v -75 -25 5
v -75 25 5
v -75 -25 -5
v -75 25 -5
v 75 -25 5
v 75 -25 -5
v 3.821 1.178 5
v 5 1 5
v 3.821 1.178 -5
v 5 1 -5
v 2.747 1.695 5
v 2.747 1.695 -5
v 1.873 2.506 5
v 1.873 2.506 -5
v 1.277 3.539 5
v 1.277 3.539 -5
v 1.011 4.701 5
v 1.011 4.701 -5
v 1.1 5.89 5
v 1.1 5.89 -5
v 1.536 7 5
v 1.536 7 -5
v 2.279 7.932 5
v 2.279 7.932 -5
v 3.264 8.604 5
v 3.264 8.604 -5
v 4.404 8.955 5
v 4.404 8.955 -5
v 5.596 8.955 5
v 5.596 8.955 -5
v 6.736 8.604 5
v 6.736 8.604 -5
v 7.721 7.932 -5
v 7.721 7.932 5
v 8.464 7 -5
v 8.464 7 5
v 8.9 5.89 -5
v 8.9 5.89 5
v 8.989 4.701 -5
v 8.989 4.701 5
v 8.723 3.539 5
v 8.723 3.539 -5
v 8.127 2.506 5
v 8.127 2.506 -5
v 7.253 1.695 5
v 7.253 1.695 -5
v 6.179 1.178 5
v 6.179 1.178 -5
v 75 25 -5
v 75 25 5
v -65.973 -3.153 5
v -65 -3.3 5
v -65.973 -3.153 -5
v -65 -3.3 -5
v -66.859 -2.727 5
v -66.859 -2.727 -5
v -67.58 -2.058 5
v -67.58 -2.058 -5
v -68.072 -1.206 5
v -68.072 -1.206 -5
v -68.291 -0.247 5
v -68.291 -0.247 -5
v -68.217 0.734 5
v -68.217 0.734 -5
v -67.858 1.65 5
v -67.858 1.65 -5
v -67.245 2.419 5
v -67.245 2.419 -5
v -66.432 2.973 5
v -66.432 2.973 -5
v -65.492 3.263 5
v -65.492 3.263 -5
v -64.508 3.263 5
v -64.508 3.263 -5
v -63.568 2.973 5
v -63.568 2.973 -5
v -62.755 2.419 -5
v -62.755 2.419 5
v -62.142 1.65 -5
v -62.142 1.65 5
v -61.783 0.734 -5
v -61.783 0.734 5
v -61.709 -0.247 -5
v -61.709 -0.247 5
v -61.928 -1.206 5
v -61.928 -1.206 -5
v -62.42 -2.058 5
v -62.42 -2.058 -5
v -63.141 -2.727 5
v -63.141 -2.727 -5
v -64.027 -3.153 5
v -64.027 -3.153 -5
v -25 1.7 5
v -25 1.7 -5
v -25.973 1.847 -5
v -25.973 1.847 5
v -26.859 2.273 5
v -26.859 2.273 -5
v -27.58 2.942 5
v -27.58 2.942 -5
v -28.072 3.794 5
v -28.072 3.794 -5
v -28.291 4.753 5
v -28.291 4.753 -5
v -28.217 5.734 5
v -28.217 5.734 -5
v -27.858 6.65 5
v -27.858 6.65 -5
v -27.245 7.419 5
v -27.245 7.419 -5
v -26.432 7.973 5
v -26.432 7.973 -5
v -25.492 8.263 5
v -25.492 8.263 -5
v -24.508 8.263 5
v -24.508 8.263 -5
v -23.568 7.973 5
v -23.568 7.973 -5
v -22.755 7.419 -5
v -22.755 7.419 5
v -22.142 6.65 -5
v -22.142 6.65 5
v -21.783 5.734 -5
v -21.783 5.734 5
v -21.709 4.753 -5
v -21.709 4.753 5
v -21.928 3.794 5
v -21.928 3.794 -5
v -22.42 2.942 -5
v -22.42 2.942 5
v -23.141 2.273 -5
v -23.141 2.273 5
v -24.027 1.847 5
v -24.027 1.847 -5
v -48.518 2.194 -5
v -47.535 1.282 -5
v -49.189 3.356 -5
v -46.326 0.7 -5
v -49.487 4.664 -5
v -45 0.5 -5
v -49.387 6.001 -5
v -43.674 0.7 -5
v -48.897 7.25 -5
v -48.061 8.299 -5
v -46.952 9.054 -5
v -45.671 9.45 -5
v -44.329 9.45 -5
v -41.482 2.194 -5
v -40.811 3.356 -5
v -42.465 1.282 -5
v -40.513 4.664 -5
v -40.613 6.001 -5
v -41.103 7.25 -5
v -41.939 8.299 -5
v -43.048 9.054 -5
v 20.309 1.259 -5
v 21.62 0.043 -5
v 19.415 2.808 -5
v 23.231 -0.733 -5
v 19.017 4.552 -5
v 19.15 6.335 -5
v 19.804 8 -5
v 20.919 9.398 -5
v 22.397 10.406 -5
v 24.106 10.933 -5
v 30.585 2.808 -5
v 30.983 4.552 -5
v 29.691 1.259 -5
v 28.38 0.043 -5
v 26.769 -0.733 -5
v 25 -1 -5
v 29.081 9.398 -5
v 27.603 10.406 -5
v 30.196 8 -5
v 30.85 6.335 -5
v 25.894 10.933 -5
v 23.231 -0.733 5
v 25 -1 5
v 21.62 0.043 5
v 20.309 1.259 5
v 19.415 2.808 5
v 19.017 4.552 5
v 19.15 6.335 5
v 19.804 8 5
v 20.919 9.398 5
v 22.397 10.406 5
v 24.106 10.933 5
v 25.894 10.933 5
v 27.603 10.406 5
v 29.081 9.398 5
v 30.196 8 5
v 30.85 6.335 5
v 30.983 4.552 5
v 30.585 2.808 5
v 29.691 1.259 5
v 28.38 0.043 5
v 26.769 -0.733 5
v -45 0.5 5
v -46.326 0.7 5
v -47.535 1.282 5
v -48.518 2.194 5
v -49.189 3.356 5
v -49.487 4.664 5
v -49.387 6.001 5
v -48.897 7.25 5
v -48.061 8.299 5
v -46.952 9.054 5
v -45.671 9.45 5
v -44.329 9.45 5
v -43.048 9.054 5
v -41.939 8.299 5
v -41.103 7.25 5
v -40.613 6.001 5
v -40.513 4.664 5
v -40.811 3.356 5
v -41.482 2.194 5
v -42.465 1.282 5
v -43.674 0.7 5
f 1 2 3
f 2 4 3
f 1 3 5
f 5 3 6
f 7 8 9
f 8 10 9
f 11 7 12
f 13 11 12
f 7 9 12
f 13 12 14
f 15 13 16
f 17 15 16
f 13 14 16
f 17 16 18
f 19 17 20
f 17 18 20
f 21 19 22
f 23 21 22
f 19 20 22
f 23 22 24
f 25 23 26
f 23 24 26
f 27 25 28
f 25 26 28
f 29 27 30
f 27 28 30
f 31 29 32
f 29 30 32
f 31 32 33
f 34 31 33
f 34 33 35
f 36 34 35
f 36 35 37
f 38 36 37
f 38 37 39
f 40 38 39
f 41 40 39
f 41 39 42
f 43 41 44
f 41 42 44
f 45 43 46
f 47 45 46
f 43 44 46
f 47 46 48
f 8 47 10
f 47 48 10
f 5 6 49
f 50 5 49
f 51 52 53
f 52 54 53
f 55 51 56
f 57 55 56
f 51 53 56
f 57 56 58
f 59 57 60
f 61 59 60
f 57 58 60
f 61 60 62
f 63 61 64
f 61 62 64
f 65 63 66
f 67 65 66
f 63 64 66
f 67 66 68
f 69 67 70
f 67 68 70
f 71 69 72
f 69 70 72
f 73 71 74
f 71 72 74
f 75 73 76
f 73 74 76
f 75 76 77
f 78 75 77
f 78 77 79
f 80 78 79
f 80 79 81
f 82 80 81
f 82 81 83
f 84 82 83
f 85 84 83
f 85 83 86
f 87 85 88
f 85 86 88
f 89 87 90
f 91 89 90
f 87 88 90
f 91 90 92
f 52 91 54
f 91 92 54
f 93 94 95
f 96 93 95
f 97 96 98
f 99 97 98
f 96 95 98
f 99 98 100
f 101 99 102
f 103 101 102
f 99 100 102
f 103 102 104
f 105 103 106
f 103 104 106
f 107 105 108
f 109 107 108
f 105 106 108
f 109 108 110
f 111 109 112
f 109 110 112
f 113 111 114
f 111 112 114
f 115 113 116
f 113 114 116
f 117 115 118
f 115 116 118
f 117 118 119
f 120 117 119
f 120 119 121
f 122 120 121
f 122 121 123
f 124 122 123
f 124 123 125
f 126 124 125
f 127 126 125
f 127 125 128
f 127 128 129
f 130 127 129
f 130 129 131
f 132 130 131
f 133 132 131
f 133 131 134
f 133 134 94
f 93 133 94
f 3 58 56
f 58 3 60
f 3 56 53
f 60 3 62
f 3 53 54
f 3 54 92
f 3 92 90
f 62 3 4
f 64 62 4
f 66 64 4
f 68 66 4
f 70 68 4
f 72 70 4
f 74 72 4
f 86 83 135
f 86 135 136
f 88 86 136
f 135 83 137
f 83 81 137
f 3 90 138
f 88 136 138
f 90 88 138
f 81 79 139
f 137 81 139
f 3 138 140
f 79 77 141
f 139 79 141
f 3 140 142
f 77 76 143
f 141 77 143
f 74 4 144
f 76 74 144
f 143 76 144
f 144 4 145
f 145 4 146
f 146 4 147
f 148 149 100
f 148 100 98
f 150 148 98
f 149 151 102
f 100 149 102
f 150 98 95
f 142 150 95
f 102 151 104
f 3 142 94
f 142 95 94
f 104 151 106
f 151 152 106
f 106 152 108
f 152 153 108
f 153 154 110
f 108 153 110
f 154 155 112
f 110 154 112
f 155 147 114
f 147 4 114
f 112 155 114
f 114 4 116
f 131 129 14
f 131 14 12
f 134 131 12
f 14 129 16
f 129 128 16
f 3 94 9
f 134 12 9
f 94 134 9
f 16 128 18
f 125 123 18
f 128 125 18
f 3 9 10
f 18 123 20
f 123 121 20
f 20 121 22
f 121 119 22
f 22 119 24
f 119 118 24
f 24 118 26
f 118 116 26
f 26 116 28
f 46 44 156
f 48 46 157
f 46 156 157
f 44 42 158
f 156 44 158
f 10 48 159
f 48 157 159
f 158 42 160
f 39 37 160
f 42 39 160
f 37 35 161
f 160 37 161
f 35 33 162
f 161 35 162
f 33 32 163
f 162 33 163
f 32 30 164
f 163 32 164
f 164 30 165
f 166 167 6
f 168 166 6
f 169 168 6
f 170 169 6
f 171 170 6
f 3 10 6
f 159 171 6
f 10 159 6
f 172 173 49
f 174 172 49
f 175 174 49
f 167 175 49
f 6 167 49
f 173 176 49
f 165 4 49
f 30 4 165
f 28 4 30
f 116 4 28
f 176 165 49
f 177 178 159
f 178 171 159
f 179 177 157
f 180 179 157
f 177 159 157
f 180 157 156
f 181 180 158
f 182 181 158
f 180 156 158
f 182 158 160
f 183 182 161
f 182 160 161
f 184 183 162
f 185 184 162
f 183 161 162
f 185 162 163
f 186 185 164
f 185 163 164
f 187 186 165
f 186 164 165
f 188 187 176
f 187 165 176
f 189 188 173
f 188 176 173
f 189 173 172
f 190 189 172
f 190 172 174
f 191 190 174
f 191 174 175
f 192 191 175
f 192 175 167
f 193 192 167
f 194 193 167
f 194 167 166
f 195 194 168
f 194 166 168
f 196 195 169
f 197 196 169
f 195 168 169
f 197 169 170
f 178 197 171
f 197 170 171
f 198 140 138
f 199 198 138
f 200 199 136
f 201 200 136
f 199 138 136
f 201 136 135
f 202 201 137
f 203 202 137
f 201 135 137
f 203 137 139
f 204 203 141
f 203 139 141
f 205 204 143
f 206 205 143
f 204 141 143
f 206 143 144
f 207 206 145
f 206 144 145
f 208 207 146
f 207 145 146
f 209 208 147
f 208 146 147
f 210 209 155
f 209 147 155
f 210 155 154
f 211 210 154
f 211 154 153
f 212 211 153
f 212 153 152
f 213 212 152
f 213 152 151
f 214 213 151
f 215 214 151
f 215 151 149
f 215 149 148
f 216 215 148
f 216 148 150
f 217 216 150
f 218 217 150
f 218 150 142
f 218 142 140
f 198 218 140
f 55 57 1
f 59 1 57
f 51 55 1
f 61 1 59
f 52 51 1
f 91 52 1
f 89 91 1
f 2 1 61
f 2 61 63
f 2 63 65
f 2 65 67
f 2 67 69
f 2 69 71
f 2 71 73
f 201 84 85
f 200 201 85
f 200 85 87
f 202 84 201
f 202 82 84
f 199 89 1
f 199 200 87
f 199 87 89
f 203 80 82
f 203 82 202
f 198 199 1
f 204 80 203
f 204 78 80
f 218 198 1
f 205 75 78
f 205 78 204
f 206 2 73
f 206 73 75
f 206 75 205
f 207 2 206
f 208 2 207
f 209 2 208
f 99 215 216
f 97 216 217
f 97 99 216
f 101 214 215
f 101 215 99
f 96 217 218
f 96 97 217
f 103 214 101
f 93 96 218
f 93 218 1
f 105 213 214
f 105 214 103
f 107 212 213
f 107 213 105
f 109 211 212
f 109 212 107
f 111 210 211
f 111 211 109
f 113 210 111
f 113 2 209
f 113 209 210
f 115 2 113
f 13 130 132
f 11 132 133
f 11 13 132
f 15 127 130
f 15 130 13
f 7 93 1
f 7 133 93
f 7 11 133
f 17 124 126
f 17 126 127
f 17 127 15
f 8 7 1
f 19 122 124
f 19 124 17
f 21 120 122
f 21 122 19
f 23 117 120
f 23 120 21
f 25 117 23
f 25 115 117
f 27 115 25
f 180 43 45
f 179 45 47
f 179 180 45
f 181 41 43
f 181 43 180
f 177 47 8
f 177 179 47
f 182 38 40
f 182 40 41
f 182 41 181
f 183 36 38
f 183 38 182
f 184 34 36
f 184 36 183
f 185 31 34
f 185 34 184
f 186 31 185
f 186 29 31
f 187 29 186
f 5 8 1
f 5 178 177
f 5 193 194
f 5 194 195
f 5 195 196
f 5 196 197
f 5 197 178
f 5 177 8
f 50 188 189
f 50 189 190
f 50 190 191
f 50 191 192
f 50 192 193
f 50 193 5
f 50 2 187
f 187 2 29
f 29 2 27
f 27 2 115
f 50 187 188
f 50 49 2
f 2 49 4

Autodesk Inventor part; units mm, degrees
ref_plane "YZ Plane" through (0, 0, 0) normal (1, 0, 0) x (0, 1, 0)
ref_plane "XZ Plane" through (0, 0, 0) normal (0, 1, 0) x (-1, 0, 0)
ref_plane "XY Plane" through (0, 0, 0) normal (0, 0, 1) x (1, 0, 0)
sketch "Sketch2" plane through (0, 0, 0) normal (0, 0, 1) x (1, 0, 0)
  line L0 (-75, -25) -> (75, -25)
  line L1 (75, -25) -> (75, 25)
  line L2 (75, 25) -> (-75, 25)
  line L3 (-75, 25) -> (-75, -25)
  line L4 (-75, -25) -> (75, 25) construction
  line L5 (75, -25) -> (-75, 25) construction
  point P0 (0, 0)
  dimension "d1" = 150
  dimension "d2" = 50
extrude "Extrusion1" add sketch "Sketch2" along normal mid plane 10
sketch "Sketch3" plane through (0, 0, 5) normal (0, 0, 1) x (1, 0, 0)
  line L0 (-75, 25) -> (-75, -25) projected
  line L1 (75, 25) -> (-75, 25) projected
  point P0 (0, 0)
  point P1 (-65, 0)
  dimension "d40" = 10
  dimension "d43" = 25
hole "Hole1" at (-65, 0, 5) direction (0, 0, -1) diameter 6.6 depth 14.2 tip angle 118 clearance for "Socket Head Cap Screw" size "M6" standard "TS Profile"
sketch "Sketch4" plane through (0, 0, 5) normal (0, 0, 1) x (1, 0, 0)
  line L0 (-75, 25) -> (-75, -25) projected
  line L1 (75, 25) -> (-75, 25) projected
  point P0 (0, 0)
  point P1 (-45, 5)
  dimension "d41" = 30
  dimension "d42" = 20
hole "Hole2" at (-45, 5, 5) direction (0, 0, -1) diameter 9 depth 14.2 tip angle 118 clearance for "Socket Head Cap Screw" size "M8" standard "TS Profile"
sketch "Sketch5" plane through (0, 0, 5) normal (0, 0, 1) x (1, 0, 0)
  line L0 (-75, 25) -> (-75, -25) projected
  line L1 (75, 25) -> (-75, 25) projected
  point P0 (0, 0)
  point P1 (-25, 5)
  dimension "d44" = 50
  dimension "d45" = 20
hole "Hole3" at (-25, 5, 5) direction (0, 0, -1) diameter 6.6 depth 14.2 tip angle 118 clearance for "Socket Head Cap Screw" size "M6" standard "TS Profile"
sketch "Sketch6" plane through (0, 0, 5) normal (0, 0, 1) x (1, 0, 0)
  line L0 (-75, 25) -> (-75, -25) projected
  line L1 (75, 25) -> (-75, 25) projected
  point P0 (0, 0)
  point P1 (5, 5)
  dimension "d46" = 80
  dimension "d47" = 20
hole "Hole4" at (5, 5, 5) direction (0, 0, -1) diameter 8 depth 14.2 tip angle 118
sketch "Sketch7" plane through (0, 0, 5) normal (0, 0, 1) x (1, 0, 0)
  line L0 (-75, 25) -> (-75, -25) projected
  line L1 (75, 25) -> (-75, 25) projected
  point P0 (0, 0)
  point P1 (25, 5)
  dimension "d48" = 100
  dimension "d49" = 20
hole "Hole5" at (25, 5, 5) direction (0, 0, -1) diameter 12 depth 14.2 tip angle 118
properties part number "홀간 거리 확인 파트-7" material "SS400"
